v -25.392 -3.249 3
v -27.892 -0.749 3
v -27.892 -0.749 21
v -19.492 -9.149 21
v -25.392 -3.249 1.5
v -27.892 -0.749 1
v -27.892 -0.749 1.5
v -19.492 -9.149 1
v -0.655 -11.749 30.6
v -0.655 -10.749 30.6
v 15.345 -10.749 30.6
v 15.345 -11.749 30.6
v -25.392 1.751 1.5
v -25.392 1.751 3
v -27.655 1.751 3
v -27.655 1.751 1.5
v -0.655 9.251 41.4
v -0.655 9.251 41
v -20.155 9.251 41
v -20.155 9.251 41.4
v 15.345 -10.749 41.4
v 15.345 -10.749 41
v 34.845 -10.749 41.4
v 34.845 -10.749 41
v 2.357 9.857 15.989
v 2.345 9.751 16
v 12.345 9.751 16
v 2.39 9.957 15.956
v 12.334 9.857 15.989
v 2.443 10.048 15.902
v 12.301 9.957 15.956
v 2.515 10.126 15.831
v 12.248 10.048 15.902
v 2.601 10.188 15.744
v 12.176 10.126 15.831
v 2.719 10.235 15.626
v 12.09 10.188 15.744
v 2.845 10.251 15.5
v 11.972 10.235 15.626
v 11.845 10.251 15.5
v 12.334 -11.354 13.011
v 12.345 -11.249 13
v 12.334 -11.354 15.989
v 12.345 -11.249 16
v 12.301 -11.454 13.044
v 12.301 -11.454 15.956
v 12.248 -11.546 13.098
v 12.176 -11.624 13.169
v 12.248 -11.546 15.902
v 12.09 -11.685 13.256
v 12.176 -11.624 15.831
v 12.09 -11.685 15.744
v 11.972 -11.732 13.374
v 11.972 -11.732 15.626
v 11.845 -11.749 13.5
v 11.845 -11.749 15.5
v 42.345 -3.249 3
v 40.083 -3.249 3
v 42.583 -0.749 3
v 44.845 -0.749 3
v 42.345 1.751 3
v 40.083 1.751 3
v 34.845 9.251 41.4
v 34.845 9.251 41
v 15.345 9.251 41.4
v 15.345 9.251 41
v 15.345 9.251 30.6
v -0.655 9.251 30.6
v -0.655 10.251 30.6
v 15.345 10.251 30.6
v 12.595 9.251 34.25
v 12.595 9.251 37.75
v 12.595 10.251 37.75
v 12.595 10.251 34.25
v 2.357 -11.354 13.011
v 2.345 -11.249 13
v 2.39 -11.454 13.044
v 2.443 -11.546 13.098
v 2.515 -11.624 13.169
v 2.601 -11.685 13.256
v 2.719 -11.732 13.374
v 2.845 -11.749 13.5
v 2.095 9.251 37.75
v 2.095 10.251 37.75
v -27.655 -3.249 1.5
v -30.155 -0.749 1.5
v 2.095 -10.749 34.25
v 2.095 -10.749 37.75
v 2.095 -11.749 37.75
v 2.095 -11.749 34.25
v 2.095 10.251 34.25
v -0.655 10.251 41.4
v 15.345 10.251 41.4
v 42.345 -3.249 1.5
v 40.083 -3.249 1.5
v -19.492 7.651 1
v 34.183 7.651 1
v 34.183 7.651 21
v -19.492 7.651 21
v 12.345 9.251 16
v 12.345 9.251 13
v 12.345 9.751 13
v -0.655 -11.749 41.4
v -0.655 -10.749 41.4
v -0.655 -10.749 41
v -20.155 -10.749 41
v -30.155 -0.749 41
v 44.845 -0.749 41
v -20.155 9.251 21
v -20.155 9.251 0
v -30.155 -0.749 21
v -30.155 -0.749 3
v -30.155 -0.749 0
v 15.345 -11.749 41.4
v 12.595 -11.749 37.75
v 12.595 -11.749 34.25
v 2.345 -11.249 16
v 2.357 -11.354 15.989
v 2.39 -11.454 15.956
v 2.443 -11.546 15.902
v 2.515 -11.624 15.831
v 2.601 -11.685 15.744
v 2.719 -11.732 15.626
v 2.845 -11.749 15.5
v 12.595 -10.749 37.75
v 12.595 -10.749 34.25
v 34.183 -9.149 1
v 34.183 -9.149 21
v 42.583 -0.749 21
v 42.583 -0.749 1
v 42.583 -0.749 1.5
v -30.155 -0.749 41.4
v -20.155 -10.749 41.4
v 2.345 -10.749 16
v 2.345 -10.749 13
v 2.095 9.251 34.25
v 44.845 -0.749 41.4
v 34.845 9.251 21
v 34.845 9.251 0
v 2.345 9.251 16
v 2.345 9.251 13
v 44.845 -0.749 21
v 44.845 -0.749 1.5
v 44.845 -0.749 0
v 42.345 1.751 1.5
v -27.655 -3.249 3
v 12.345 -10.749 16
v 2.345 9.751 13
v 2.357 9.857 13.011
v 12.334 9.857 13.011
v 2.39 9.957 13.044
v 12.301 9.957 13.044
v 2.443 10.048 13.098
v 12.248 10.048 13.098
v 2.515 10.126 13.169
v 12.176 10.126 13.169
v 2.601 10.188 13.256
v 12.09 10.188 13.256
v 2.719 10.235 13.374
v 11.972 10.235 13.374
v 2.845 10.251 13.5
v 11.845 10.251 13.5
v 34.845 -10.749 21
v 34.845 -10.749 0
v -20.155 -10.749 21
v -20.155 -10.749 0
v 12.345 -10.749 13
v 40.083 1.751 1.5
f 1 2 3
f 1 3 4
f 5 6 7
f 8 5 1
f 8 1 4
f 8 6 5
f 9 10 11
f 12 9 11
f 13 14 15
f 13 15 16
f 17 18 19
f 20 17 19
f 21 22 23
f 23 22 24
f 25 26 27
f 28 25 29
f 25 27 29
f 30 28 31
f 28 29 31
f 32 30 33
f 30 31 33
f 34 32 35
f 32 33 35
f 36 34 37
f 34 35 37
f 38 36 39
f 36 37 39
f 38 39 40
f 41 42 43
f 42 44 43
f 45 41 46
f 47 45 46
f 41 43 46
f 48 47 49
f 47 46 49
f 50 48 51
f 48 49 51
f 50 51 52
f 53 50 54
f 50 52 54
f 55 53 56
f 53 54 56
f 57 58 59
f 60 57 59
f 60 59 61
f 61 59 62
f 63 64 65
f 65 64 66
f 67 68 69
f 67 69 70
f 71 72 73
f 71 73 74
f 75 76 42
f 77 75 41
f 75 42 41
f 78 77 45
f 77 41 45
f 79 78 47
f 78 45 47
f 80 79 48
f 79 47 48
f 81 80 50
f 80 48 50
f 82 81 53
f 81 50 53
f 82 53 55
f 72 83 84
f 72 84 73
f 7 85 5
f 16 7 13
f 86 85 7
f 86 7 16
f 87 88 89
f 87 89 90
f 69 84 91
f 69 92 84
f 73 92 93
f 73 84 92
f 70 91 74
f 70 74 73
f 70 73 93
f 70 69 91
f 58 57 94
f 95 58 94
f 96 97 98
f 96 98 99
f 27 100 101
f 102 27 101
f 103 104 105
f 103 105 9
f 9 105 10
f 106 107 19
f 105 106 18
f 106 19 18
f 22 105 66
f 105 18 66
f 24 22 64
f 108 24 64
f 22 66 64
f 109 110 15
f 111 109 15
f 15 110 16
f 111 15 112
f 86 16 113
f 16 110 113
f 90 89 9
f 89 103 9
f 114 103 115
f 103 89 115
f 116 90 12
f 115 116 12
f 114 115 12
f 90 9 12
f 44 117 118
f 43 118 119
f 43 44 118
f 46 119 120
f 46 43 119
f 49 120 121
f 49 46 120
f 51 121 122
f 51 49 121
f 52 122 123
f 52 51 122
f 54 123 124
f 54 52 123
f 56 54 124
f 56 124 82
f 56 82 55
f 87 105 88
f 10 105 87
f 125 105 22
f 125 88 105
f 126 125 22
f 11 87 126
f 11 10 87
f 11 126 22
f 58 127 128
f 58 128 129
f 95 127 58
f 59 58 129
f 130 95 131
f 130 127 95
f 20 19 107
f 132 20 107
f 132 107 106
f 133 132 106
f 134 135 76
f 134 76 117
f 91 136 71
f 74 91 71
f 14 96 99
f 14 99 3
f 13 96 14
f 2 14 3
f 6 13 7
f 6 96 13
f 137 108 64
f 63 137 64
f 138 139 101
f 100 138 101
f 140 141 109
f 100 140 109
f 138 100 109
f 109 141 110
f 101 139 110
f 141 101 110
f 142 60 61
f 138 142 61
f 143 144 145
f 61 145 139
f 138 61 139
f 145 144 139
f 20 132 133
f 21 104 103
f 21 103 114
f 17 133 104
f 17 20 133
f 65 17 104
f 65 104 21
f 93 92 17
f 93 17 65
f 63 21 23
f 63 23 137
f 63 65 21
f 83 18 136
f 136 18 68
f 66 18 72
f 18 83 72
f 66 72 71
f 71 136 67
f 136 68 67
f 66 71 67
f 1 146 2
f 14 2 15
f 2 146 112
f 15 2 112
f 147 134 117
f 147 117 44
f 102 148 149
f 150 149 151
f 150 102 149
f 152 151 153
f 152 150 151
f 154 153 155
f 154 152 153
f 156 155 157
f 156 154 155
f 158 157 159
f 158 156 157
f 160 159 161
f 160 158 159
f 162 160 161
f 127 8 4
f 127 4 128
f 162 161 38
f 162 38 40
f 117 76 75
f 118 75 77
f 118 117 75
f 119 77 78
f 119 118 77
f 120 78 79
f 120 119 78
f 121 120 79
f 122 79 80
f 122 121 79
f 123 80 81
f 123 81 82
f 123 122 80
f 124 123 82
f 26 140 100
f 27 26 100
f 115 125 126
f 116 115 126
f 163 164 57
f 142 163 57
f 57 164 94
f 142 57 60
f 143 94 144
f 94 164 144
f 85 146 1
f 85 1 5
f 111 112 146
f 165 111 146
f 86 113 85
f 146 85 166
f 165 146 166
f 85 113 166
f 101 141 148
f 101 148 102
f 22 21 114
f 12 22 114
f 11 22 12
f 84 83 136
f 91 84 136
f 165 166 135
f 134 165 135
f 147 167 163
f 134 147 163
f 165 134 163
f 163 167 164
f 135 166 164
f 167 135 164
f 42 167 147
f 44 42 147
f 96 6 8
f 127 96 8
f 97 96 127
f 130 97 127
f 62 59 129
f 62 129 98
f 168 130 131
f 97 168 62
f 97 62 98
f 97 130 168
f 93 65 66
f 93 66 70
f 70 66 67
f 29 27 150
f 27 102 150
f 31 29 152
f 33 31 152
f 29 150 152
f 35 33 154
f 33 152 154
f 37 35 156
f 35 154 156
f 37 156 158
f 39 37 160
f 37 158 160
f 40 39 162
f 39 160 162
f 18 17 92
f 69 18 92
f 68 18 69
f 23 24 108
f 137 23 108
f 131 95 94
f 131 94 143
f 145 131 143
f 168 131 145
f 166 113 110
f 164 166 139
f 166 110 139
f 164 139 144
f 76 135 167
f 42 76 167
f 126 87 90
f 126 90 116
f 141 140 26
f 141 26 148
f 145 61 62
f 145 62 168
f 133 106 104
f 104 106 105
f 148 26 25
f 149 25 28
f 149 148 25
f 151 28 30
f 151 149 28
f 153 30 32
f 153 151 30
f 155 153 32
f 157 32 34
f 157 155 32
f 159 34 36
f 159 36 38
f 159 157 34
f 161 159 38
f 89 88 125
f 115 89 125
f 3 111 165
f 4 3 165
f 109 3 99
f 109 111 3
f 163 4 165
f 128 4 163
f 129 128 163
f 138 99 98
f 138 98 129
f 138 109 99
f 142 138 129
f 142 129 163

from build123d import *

# Parameters (mm, degrees)
BOSS_EXTRU_1_DEPTH           = 1
BOSS_EXTRU_2_DEPTH           = 20
ENL_V_MAT_EXTRU_1_DEPTH      = 51.671873049
ENL_V_MAT_EXTRU_1_DEPTH_BACK = 51.671873049
ESQUISSE5_W                  = 1.5
ESQUISSE5_H                  = 5
ESQUISSE9_W                  = 10
ESQUISSE9_H                  = 3
BOSS_EXTRU_5_DEPTH           = 1
CONG_1_R                     = 0.5
ESQUISSE10_W                 = 10
ESQUISSE10_H                 = 3
BOSS_EXTRU_6_DEPTH           = 1
CONG_2_R                     = 0.5
BOSS_EXTRU_7_DEPTH           = 0.4
ESQUISSE13_W                 = 16
ESQUISSE13_H                 = 10.8
ESQUISSE13_W_2               = 10.5
ESQUISSE13_H_2               = 3.5
BOSS_EXTRU_8_DEPTH           = 1


with BuildPart() as part:
    # Esquisse1 → Boss.-Extru.1 (new body)
    with BuildSketch(Plane.XY):
        Polygon((34.845351237, 9.251363312), (-20.154648763, 9.251363312), (-30.154648763, -0.748636688), (-20.154648763, -10.748636688), (34.845351237, -10.748636688), (44.845351237, -0.748636688), align=None)
    extrude(amount=BOSS_EXTRU_1_DEPTH)

    # Esquisse2 → Boss.-Extru.2 (add)
    with BuildSketch(Plane.XY.offset(1)):
        Polygon((-20.154648763, -10.748636688), (34.845351237, -10.748636688), (44.845351237, -0.748636688), (34.845351237, 9.251363312), (-20.154648763, 9.251363312), (-30.154648763, -0.748636688), align=None)
        Polygon((-19.491907063, 7.651363312), (-27.891907063, -0.748636688), (-19.491907063, -9.148636688), (34.182609538, -9.148636688), (42.582609538, -0.748636688), (34.182609538, 7.651363312), align=None, mode=Mode.SUBTRACT)
    extrude(amount=BOSS_EXTRU_2_DEPTH)

    # Esquisse5 → Enlèv. mat.-Extru.1 (cut, two sides: drawn at the far end of the back side and taken through both)
    with BuildSketch(Plane(origin=(0, 0, 0), x_dir=(0, 0, -1), z_dir=(1, 0, 0)).offset(-ENL_V_MAT_EXTRU_1_DEPTH_BACK)):
        with Locations((-2.25, -0.748636688)):
            Rectangle(ESQUISSE5_W, ESQUISSE5_H)
    extrude(amount=ENL_V_MAT_EXTRU_1_DEPTH + ENL_V_MAT_EXTRU_1_DEPTH_BACK, mode=Mode.SUBTRACT)

    # Esquisse9 → Boss.-Extru.5 (add)
    with BuildSketch(Plane(origin=(0, 9.251363312, 0), x_dir=(1, 0, 0), z_dir=(0, 1, 0))):
        with Locations((7.345351237, -14.5)):
            Rectangle(ESQUISSE9_W, ESQUISSE9_H)
    extrude(amount=BOSS_EXTRU_5_DEPTH)

    # Congé1
    cong_1_edges = [part.edges().sort_by_distance(p)[0] for p in [
        (2.345351237, 10.251363312, 14.5),
        (7.345351237, 10.251363312, 16),
        (12.345351237, 10.251363312, 14.5),
        (7.345351237, 10.251363312, 13),
    ]]
    fillet(cong_1_edges, radius=CONG_1_R)

    # Esquisse10 → Boss.-Extru.6 (add)
    with BuildSketch(Plane.XZ.offset(10.748636688)):
        with Locations((7.345351237, 14.5)):
            Rectangle(ESQUISSE10_W, ESQUISSE10_H)
    extrude(amount=BOSS_EXTRU_6_DEPTH)

    # Congé2
    cong_2_edges = [part.edges().sort_by_distance(p)[0] for p in [
        (2.345351237, -11.748636688, 14.5),
        (7.345351237, -11.748636688, 13),
        (12.345351237, -11.748636688, 14.5),
        (7.345351237, -11.748636688, 16),
    ]]
    fillet(cong_2_edges, radius=CONG_2_R)


with BuildPart() as body_2:
    # Esquisse12 → Boss.-Extru.7 (new body)
    with BuildSketch(Plane.XY.offset(41)):
        Polygon((44.845351237, -0.748636688), (34.845351237, 9.251363312), (-20.154648763, 9.251363312), (-30.154648763, -0.748636688), (-20.154648763, -10.748636688), (34.845351237, -10.748636688), align=None)
    extrude(amount=BOSS_EXTRU_7_DEPTH)

    # Esquisse13 → Boss.-Extru.8 (add)
    with BuildSketch(Plane(origin=(0, 9.251363312, 0), x_dir=(1, 0, 0), z_dir=(0, 1, 0))):
        with Locations((7.345351237, -36)):
            Rectangle(ESQUISSE13_W, ESQUISSE13_H)
        with Locations((7.345351237, -36)):
            Rectangle(ESQUISSE13_W_2, ESQUISSE13_H_2, mode=Mode.SUBTRACT)
    boss_extru_8 = extrude(amount=BOSS_EXTRU_8_DEPTH)

    # Symétrie1: Boss.-Extru.8 across plane
    add(boss_extru_8.mirror(Plane.ZX.offset(-0.748636688)))


solid = Compound([part.part, body_2.part])
